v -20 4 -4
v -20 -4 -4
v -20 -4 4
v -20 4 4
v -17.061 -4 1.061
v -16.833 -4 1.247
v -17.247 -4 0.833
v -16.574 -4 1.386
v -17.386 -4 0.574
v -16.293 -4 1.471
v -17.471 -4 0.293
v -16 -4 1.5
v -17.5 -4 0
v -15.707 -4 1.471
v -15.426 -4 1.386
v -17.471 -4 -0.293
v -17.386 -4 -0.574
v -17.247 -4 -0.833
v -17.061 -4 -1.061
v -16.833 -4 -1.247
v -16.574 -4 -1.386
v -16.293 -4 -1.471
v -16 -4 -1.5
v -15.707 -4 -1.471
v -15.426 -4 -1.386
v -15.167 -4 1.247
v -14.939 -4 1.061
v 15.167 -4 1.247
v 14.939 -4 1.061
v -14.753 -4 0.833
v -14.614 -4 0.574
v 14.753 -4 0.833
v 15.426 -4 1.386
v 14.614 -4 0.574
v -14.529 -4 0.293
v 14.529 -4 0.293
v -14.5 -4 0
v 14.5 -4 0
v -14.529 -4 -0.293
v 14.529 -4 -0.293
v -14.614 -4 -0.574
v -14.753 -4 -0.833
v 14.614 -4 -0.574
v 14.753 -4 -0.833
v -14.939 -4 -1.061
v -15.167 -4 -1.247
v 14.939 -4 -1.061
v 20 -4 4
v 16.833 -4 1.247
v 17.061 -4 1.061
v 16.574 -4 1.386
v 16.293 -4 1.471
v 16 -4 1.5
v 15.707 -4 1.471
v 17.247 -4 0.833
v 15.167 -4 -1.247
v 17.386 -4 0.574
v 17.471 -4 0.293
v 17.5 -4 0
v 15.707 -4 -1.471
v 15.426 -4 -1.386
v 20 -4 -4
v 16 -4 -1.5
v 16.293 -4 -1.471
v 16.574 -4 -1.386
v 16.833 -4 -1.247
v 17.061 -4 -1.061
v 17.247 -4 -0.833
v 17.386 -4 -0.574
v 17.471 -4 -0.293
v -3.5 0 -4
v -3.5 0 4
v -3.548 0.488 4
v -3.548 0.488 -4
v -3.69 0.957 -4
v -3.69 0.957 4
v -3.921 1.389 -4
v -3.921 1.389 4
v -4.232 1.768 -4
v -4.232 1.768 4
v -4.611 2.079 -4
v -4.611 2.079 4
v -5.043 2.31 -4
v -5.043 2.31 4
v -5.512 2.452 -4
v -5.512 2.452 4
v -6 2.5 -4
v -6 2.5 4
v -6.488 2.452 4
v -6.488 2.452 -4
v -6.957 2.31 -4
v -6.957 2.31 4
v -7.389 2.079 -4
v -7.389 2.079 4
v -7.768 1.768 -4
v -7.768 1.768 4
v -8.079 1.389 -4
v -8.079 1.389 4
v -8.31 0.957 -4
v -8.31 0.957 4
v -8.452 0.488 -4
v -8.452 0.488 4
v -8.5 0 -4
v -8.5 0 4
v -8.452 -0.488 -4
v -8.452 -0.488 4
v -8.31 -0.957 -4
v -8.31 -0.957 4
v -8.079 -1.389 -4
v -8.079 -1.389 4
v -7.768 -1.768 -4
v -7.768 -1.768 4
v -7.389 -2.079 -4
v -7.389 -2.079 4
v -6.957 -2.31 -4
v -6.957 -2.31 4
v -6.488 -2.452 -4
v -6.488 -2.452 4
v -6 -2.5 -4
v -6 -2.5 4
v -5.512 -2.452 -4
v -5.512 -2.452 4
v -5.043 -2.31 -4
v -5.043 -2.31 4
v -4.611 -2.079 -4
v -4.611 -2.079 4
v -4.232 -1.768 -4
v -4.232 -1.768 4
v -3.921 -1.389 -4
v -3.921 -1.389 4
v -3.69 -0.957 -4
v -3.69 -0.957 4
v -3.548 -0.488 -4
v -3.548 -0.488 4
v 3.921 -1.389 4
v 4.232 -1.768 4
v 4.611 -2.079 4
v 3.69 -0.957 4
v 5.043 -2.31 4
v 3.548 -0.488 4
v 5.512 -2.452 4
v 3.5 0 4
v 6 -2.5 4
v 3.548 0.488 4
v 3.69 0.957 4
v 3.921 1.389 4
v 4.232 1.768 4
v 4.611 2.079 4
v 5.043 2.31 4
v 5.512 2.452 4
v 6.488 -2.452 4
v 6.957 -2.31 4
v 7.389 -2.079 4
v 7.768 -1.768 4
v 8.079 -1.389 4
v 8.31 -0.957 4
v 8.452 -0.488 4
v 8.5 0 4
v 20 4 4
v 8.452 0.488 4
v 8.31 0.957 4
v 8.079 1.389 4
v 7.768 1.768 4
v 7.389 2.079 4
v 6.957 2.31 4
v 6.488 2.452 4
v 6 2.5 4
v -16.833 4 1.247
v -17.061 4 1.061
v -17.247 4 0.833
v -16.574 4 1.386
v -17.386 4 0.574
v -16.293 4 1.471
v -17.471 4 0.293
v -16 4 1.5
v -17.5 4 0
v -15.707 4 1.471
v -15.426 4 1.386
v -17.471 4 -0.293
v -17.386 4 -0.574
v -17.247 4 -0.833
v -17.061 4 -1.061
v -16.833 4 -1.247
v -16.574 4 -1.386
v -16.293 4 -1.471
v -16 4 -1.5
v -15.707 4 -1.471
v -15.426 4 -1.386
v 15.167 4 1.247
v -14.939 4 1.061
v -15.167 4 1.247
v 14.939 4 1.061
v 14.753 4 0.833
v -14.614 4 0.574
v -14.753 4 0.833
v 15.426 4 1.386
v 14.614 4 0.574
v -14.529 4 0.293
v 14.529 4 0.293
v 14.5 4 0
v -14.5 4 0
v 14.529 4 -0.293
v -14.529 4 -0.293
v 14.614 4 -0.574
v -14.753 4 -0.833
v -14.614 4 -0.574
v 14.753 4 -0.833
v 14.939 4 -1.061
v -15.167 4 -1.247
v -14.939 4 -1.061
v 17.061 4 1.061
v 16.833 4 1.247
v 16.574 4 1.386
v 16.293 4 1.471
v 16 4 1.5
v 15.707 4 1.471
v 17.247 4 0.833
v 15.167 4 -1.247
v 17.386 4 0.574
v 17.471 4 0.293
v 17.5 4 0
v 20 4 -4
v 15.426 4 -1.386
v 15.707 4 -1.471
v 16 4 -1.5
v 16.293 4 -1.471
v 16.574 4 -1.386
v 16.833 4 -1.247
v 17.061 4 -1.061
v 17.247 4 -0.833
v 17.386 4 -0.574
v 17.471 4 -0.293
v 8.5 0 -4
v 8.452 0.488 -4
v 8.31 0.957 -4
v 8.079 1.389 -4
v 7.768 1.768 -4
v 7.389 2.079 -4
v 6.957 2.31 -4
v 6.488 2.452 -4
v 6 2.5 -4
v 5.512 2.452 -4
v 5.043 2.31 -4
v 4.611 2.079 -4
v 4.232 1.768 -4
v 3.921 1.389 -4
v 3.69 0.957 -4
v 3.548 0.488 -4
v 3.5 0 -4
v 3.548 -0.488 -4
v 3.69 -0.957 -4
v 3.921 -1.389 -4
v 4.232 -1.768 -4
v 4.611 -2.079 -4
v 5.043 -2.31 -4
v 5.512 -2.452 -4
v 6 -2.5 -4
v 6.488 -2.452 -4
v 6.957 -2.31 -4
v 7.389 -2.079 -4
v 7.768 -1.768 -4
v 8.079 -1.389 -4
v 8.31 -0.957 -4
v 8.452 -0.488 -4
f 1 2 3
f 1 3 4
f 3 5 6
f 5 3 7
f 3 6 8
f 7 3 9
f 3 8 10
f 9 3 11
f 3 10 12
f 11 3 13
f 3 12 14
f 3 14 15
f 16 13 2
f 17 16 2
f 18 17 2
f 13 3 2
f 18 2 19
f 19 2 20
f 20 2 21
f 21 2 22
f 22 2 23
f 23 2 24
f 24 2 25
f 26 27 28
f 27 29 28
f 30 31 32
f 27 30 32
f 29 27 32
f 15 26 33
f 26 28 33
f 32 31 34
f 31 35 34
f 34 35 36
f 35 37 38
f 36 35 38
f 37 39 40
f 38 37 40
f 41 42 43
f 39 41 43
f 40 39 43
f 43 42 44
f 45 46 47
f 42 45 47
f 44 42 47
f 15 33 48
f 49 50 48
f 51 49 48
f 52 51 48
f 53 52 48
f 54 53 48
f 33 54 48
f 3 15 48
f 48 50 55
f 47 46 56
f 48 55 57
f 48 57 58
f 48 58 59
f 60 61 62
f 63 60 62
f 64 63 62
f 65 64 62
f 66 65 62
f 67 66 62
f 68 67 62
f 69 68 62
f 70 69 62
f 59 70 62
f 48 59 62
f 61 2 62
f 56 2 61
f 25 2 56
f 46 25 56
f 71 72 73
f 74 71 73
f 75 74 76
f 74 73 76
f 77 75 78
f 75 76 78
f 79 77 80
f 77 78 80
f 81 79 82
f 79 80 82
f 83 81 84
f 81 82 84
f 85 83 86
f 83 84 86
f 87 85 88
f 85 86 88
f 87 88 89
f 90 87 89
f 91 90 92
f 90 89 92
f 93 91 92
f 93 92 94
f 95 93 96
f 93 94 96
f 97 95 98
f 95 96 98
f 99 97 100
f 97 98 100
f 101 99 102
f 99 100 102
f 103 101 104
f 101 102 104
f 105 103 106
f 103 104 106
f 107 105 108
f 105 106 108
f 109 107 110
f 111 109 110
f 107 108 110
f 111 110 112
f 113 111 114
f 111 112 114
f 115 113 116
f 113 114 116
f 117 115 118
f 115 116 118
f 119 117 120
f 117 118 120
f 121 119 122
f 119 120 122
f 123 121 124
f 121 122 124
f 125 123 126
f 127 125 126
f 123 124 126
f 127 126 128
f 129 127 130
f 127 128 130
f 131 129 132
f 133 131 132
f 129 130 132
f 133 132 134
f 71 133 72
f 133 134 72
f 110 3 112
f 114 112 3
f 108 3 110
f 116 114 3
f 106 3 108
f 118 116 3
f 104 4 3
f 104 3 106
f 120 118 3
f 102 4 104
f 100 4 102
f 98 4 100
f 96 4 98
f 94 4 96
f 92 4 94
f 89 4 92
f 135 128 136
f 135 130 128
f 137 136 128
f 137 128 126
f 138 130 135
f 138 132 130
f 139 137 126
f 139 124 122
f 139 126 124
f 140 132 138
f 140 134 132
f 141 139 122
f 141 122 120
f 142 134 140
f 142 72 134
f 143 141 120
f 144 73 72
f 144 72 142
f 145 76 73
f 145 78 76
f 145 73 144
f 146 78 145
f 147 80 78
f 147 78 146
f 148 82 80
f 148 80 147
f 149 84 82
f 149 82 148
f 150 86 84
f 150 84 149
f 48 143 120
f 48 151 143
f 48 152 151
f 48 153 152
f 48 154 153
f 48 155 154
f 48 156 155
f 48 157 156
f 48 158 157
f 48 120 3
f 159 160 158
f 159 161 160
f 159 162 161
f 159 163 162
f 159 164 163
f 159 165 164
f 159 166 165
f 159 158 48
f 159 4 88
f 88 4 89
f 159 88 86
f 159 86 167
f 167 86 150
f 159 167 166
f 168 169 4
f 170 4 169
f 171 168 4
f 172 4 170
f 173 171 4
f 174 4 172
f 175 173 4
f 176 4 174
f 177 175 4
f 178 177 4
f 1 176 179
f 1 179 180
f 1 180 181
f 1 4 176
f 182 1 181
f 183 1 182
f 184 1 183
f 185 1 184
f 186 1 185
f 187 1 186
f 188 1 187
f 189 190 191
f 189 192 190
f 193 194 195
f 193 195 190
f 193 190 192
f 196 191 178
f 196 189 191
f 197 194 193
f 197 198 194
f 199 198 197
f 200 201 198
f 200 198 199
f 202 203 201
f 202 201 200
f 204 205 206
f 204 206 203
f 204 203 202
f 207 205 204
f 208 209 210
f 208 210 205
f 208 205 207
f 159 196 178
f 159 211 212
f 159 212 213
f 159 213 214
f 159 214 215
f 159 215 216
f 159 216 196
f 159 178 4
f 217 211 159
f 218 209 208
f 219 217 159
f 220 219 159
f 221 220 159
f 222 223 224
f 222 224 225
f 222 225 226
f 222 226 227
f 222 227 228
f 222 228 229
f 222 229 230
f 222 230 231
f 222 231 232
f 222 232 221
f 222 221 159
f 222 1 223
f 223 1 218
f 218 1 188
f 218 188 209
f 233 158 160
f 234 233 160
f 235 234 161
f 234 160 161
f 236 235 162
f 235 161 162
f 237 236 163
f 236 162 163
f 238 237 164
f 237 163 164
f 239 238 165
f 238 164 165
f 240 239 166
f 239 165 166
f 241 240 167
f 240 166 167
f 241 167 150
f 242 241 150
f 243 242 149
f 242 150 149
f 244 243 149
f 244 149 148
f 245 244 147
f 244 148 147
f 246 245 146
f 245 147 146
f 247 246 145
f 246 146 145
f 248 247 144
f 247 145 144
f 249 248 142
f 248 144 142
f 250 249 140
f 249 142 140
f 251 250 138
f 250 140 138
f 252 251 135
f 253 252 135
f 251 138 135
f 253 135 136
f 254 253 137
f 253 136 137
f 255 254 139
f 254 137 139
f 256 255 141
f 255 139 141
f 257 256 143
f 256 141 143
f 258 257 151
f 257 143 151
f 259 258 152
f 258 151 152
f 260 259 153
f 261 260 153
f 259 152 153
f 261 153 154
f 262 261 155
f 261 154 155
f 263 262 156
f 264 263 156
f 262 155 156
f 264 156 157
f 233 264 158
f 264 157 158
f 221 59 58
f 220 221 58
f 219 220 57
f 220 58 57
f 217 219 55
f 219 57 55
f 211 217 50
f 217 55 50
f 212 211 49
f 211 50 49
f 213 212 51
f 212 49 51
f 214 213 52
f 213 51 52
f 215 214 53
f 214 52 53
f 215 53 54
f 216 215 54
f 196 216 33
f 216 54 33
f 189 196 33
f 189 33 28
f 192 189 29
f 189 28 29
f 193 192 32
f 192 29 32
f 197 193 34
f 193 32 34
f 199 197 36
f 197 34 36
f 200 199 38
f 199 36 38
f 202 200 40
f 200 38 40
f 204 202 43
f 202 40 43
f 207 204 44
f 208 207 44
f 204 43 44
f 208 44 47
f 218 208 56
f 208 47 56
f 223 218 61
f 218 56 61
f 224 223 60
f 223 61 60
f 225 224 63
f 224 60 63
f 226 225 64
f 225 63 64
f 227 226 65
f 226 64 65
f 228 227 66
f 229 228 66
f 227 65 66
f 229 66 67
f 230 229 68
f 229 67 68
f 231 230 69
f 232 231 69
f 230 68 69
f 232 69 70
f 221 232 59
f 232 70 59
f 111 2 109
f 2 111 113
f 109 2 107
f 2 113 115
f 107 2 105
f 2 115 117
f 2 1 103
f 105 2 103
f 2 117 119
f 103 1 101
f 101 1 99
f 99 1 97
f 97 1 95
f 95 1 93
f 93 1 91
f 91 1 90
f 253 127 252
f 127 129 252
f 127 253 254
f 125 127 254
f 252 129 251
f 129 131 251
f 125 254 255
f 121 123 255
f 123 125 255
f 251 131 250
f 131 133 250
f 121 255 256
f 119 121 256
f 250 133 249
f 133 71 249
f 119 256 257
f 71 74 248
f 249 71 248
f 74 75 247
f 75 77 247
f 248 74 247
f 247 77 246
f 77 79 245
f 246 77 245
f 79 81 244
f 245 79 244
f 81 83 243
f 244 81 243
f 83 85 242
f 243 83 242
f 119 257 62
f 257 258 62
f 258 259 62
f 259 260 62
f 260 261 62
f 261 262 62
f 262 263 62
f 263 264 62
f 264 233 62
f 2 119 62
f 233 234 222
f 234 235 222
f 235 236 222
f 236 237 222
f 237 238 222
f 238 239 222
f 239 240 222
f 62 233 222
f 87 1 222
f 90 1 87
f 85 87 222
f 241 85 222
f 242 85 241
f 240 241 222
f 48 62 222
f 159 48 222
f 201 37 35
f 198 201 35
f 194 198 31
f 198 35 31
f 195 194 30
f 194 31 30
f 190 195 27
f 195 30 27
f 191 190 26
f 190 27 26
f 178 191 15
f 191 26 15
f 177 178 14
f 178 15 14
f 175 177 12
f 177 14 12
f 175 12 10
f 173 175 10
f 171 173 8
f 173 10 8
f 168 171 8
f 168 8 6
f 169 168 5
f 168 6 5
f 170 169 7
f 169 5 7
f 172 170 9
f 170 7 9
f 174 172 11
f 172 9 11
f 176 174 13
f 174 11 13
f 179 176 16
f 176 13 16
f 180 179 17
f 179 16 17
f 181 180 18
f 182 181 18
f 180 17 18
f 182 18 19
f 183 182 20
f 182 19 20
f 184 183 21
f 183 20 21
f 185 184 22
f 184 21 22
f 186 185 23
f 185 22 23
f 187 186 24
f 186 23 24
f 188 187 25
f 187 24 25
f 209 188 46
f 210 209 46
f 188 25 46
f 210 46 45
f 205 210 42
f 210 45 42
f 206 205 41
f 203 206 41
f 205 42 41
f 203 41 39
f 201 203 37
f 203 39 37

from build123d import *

# Parameters (mm, degrees)
BOX_W           = 40
BOX_H           = 8
BOX_DEPTH       = 8
SKETCH_R        = 2.5
POCKET_DEPTH    = 8
SKETCH001_R     = 1.5
POCKET001_DEPTH = 8


with BuildPart() as part:
    # Box → Box (new body)
    with BuildSketch(Plane(origin=(-20, -4, -4), x_dir=(1, 0, 0), z_dir=(0, 0, 1))):
        with Locations((20, 4)):
            Rectangle(BOX_W, BOX_H)
    extrude(amount=BOX_DEPTH)

    # Sketch → Pocket (cut)
    with BuildSketch(Plane(origin=(-20, -4, 4), x_dir=(1, 0, 0), z_dir=(0, 0, 1))):
        with Locations((26, 4)):
            Circle(SKETCH_R)
        with Locations((14, 4)):
            Circle(SKETCH_R)
    extrude(amount=-POCKET_DEPTH, mode=Mode.SUBTRACT)

    # Sketch001 → Pocket001 (cut)
    with BuildSketch(Plane(origin=(-20, -4, -4), x_dir=(1, 0, 0), z_dir=(0, -1, 0))):
        with Locations((4, 4)):
            Circle(SKETCH001_R)
        with Locations((36, 4)):
            Circle(SKETCH001_R)
    extrude(amount=-POCKET001_DEPTH, mode=Mode.SUBTRACT)


solid = part.part
